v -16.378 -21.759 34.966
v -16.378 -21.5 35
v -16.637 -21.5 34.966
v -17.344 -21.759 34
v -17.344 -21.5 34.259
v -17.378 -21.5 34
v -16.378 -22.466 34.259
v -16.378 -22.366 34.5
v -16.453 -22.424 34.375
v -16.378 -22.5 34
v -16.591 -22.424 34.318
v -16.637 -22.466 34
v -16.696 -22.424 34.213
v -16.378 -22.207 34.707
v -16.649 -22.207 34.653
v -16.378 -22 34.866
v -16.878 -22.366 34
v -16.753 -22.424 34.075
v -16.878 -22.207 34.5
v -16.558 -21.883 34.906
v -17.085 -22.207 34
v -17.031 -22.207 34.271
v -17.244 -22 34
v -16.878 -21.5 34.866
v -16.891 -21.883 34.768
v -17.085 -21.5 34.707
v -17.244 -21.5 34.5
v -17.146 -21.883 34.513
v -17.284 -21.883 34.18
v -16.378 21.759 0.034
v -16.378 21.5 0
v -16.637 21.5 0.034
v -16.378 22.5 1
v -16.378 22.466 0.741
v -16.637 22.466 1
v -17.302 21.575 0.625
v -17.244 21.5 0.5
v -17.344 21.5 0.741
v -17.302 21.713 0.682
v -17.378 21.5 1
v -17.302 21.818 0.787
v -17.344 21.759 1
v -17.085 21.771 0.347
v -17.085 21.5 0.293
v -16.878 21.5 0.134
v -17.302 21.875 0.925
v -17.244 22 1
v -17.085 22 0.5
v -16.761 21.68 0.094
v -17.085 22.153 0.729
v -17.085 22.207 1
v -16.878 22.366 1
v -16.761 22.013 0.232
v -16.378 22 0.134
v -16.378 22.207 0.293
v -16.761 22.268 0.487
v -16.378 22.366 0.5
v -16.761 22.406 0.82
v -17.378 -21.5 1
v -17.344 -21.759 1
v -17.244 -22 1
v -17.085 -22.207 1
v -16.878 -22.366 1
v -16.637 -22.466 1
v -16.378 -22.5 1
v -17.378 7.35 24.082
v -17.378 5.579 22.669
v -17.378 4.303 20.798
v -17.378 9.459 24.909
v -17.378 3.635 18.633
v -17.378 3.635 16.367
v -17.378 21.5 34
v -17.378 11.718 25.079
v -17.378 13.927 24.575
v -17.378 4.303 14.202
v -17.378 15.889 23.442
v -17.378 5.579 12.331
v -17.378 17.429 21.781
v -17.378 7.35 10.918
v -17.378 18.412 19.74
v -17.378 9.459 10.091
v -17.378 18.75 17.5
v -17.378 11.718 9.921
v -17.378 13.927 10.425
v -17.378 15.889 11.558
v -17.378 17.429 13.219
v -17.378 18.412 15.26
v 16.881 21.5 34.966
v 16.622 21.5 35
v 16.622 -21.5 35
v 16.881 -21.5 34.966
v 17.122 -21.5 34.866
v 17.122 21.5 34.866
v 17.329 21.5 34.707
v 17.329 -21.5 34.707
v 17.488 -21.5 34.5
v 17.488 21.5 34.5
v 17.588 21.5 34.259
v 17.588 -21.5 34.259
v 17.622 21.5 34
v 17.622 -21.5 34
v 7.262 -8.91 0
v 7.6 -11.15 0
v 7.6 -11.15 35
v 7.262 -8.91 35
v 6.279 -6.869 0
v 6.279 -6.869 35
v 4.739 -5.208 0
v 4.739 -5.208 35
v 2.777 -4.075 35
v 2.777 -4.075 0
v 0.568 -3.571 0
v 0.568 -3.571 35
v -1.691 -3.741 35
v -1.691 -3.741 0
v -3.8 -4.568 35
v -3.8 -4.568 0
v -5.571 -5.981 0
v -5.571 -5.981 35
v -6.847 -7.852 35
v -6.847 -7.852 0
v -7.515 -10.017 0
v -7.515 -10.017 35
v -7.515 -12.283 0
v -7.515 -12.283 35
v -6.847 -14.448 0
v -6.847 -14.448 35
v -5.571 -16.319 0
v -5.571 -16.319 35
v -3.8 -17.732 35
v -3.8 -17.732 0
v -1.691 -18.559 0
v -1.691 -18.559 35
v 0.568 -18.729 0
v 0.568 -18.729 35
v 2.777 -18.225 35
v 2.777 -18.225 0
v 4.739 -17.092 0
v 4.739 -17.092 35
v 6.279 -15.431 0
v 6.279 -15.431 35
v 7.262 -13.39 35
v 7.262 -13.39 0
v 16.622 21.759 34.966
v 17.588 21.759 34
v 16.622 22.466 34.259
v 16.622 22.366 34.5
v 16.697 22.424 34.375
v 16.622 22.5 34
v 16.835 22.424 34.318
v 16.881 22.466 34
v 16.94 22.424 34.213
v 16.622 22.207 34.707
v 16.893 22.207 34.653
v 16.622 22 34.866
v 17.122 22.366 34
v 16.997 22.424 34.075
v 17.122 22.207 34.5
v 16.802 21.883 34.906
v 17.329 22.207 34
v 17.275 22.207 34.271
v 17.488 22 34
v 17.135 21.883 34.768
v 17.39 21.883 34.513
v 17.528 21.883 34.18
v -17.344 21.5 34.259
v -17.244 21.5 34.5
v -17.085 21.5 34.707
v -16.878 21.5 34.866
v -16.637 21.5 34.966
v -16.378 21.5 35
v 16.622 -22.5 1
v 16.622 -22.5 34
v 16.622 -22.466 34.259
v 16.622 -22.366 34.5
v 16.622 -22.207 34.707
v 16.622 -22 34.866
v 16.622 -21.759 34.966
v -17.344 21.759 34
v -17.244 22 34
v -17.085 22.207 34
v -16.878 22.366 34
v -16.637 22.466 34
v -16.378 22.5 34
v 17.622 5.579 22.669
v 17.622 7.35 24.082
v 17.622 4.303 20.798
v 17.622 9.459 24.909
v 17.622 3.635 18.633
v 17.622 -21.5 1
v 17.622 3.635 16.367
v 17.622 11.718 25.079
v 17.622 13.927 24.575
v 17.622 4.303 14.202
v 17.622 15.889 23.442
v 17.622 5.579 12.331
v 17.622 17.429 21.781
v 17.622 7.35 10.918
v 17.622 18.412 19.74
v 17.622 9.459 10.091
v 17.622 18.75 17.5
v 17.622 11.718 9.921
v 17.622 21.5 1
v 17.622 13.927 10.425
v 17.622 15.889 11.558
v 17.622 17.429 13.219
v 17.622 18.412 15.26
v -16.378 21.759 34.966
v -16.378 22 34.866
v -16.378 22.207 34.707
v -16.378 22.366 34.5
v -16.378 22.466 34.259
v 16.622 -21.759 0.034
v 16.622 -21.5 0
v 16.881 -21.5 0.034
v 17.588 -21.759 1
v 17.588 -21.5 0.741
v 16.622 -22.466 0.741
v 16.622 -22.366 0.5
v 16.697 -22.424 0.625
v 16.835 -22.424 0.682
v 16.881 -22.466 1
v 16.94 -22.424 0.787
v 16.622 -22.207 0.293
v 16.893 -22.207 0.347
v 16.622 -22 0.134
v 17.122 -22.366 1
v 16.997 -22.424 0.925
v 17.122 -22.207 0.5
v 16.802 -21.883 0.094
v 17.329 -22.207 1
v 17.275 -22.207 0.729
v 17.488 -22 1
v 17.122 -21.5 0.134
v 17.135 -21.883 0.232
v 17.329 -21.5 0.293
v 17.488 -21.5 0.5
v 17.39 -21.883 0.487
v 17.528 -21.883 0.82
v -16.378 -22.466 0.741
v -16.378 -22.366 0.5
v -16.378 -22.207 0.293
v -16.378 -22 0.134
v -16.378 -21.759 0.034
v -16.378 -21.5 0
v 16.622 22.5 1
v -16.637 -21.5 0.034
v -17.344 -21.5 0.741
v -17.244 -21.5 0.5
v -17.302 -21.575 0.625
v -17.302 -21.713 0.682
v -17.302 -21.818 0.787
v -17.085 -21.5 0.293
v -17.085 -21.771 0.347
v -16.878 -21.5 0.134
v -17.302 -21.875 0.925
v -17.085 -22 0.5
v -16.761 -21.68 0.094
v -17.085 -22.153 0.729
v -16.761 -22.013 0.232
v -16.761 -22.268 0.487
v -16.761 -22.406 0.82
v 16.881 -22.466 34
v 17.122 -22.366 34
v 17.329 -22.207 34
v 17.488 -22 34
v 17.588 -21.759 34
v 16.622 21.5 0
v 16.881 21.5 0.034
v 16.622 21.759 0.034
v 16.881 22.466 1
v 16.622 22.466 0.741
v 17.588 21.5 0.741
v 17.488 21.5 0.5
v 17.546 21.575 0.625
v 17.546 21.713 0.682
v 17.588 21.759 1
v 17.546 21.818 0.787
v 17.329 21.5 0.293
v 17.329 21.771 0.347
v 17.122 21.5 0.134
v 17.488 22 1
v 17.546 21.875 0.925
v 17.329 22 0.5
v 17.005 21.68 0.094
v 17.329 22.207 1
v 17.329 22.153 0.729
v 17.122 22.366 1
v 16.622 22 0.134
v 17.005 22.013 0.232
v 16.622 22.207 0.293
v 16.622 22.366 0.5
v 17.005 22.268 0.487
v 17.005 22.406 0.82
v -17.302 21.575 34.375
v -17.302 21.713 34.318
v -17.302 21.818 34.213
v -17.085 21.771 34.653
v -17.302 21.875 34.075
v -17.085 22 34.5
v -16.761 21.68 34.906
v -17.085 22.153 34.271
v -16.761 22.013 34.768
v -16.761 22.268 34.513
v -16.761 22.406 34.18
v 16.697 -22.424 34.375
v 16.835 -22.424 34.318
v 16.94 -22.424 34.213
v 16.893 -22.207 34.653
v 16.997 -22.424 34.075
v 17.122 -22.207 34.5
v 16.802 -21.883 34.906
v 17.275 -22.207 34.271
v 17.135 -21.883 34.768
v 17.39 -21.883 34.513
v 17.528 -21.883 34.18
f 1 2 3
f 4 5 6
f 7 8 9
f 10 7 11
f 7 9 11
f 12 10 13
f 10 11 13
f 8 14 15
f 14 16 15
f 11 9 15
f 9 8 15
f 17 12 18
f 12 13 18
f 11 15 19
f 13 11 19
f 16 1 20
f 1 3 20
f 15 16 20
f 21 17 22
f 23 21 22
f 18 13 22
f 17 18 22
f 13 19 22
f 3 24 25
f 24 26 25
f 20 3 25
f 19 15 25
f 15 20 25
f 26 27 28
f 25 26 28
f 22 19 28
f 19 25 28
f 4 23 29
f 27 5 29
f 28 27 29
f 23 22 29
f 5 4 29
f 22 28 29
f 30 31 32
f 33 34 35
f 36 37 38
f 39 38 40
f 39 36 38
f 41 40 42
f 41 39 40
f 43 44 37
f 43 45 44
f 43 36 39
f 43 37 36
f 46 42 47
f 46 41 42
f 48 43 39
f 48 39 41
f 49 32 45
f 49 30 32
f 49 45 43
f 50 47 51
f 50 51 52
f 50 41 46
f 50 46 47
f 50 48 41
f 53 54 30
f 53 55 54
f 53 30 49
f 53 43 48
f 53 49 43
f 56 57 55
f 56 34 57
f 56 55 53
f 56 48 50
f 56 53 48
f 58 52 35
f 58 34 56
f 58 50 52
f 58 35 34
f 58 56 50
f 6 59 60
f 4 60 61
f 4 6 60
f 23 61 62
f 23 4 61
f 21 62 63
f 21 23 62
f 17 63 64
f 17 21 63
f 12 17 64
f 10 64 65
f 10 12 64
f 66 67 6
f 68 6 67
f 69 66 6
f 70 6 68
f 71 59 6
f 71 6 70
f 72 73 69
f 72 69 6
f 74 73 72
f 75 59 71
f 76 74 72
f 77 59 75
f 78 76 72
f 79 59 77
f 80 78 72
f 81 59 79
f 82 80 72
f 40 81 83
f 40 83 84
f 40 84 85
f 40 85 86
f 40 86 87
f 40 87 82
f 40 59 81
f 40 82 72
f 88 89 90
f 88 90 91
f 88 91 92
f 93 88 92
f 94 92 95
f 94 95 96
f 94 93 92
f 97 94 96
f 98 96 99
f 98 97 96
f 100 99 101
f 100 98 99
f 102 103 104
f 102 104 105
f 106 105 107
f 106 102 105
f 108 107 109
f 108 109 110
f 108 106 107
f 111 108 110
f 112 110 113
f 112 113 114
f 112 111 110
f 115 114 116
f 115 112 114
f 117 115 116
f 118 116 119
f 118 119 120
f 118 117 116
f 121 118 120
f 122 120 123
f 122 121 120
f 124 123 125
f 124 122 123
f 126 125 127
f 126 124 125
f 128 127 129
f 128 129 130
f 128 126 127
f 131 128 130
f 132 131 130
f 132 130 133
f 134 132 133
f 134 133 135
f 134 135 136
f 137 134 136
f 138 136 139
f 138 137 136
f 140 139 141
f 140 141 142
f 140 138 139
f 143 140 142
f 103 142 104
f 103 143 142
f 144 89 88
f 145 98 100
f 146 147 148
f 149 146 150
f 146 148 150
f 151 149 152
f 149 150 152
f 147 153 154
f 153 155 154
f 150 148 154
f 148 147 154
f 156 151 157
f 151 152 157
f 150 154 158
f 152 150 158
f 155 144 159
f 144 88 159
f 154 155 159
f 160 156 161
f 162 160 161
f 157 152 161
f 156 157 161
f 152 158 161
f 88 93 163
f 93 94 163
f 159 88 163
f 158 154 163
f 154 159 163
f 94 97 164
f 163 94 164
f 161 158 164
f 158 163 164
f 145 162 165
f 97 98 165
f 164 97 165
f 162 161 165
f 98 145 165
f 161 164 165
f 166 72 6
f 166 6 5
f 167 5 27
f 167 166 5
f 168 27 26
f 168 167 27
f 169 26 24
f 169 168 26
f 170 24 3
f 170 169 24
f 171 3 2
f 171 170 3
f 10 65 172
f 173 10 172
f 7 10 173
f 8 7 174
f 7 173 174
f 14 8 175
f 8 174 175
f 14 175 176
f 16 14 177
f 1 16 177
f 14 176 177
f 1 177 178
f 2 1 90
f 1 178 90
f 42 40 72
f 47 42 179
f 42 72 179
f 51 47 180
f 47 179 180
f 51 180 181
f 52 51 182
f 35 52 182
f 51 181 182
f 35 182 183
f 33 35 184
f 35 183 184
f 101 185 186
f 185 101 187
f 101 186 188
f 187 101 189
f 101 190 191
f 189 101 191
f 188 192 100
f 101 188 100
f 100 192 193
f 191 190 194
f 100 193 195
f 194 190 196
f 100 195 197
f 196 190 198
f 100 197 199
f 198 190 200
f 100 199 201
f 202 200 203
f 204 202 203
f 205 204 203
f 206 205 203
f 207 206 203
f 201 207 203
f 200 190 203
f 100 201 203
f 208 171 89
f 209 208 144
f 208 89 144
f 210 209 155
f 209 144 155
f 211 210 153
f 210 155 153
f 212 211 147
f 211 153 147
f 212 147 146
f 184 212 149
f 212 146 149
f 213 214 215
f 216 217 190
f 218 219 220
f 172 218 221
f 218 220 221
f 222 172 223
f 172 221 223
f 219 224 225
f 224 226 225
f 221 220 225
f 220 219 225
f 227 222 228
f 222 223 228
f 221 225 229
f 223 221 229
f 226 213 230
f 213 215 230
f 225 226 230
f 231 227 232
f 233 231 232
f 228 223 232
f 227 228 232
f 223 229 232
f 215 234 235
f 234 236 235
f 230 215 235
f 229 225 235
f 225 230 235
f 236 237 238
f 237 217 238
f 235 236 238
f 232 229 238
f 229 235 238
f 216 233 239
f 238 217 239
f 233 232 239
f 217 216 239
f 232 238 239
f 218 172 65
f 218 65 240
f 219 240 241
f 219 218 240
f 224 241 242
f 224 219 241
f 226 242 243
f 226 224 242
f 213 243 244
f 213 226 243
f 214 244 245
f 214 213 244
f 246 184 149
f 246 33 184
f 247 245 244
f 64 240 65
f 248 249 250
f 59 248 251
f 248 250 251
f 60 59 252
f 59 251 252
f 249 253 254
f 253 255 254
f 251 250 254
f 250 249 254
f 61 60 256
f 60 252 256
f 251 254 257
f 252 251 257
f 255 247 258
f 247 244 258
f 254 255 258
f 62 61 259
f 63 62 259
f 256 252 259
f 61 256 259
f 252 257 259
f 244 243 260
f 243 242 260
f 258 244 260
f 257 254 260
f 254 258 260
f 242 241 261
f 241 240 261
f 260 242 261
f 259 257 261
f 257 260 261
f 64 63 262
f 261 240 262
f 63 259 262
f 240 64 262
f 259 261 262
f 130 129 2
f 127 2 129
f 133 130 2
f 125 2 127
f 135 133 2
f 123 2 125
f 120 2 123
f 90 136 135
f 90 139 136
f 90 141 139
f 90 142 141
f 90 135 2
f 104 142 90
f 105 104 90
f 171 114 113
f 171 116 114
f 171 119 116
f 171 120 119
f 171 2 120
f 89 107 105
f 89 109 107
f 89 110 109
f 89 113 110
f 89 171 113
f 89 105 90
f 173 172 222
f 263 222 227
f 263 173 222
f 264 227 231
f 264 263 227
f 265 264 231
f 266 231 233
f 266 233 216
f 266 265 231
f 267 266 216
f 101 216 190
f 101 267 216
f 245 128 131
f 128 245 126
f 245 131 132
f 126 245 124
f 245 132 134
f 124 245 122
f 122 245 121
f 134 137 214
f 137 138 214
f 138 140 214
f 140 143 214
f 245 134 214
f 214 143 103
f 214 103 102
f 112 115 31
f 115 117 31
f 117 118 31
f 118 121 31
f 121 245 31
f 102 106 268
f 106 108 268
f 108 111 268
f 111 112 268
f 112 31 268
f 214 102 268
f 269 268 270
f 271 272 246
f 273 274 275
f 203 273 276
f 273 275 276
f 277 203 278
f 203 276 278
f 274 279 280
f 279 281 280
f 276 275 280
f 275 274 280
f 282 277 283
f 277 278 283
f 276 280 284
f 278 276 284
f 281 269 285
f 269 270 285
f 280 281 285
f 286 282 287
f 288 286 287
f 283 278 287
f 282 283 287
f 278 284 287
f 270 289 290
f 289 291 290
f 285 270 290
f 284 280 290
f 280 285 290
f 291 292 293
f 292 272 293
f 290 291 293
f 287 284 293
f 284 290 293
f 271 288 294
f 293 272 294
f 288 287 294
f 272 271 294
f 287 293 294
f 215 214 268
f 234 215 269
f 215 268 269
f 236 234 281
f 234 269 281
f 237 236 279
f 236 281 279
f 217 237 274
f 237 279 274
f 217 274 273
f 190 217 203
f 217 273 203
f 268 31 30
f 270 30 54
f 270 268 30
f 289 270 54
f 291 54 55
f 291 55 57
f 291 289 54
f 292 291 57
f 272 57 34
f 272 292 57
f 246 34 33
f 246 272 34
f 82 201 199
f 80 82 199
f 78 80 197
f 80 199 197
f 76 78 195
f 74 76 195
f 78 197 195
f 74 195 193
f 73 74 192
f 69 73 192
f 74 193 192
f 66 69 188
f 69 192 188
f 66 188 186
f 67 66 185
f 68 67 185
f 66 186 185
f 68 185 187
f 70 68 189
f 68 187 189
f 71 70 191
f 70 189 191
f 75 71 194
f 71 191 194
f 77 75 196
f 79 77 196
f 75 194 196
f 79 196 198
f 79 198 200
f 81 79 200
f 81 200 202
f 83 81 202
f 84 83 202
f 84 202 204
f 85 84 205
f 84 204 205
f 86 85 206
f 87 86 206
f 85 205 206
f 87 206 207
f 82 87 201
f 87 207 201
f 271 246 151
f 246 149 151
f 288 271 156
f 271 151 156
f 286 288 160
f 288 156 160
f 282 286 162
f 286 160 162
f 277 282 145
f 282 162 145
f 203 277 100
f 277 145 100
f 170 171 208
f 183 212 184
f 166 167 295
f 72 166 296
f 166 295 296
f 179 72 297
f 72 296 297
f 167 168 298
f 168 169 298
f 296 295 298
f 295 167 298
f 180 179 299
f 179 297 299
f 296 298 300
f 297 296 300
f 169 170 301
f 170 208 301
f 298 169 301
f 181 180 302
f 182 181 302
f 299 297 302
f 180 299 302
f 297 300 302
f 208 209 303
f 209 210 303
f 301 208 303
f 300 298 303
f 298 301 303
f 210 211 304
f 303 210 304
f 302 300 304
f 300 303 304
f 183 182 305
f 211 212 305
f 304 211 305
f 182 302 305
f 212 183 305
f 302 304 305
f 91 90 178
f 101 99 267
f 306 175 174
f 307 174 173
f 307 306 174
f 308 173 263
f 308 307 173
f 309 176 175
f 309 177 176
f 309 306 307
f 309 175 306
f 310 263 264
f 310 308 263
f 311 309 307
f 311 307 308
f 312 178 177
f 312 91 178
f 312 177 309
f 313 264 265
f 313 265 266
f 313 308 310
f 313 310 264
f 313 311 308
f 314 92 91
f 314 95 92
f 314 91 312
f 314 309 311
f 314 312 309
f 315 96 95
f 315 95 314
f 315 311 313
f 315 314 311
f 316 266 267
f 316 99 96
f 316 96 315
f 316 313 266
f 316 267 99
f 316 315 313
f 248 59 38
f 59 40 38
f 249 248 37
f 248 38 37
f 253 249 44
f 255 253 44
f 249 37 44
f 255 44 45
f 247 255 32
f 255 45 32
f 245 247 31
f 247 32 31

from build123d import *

# Parameters (mm, degrees)
SCHIZZO1_W                   = 35
SCHIZZO1_H                   = 45
SCHIZZO1_R                   = 7.6
ESTRUSIONE_ESTRUSIONE1_DEPTH = 35
SCHIZZO3_R                   = 7.6
TAGLIO_ESTRUSIONE1_DEPTH     = 35
RACCORDO1_R                  = 1


with BuildPart() as part:
    # Schizzo1 → Estrusione-Estrusione1 (new body)
    with BuildSketch(Plane.XY):
        with Locations((0.121961372, 0)):
            Rectangle(SCHIZZO1_W, SCHIZZO1_H)
        with Locations((0, -11.15)):
            Circle(SCHIZZO1_R, mode=Mode.SUBTRACT)
    extrude(amount=ESTRUSIONE_ESTRUSIONE1_DEPTH)

    # Schizzo3 → Taglio-Estrusione1 (cut)
    with BuildSketch(Plane(origin=(17.621961372, 0, 0), x_dir=(0, 0, -1), z_dir=(1, 0, 0))):
        with Locations(Location((-17.5, 11.15, 0), (0, 0, 90))):
            Circle(SCHIZZO3_R)
    extrude(amount=-TAGLIO_ESTRUSIONE1_DEPTH, mode=Mode.SUBTRACT)

    # Raccordo1
    raccordo1_edges = [part.edges().sort_by_distance(p)[0] for p in [
        (17.621961372, 0, 35),
        (0.121961372, 22.5, 35),
        (-17.378038628, 0, 35),
        (0.121961372, 22.5, 0),
        (17.621961372, 0, 0),
        (0.121961372, -22.5, 0),
        (-17.378038628, 0, 0),
        (0.121961372, -22.5, 35),
        (-17.378038628, 22.5, 17.5),
        (17.621961372, 22.5, 17.5),
        (17.621961372, -22.5, 17.5),
        (-17.378038628, -22.5, 17.5),
    ]]
    fillet(raccordo1_edges, radius=RACCORDO1_R)


solid = part.part
